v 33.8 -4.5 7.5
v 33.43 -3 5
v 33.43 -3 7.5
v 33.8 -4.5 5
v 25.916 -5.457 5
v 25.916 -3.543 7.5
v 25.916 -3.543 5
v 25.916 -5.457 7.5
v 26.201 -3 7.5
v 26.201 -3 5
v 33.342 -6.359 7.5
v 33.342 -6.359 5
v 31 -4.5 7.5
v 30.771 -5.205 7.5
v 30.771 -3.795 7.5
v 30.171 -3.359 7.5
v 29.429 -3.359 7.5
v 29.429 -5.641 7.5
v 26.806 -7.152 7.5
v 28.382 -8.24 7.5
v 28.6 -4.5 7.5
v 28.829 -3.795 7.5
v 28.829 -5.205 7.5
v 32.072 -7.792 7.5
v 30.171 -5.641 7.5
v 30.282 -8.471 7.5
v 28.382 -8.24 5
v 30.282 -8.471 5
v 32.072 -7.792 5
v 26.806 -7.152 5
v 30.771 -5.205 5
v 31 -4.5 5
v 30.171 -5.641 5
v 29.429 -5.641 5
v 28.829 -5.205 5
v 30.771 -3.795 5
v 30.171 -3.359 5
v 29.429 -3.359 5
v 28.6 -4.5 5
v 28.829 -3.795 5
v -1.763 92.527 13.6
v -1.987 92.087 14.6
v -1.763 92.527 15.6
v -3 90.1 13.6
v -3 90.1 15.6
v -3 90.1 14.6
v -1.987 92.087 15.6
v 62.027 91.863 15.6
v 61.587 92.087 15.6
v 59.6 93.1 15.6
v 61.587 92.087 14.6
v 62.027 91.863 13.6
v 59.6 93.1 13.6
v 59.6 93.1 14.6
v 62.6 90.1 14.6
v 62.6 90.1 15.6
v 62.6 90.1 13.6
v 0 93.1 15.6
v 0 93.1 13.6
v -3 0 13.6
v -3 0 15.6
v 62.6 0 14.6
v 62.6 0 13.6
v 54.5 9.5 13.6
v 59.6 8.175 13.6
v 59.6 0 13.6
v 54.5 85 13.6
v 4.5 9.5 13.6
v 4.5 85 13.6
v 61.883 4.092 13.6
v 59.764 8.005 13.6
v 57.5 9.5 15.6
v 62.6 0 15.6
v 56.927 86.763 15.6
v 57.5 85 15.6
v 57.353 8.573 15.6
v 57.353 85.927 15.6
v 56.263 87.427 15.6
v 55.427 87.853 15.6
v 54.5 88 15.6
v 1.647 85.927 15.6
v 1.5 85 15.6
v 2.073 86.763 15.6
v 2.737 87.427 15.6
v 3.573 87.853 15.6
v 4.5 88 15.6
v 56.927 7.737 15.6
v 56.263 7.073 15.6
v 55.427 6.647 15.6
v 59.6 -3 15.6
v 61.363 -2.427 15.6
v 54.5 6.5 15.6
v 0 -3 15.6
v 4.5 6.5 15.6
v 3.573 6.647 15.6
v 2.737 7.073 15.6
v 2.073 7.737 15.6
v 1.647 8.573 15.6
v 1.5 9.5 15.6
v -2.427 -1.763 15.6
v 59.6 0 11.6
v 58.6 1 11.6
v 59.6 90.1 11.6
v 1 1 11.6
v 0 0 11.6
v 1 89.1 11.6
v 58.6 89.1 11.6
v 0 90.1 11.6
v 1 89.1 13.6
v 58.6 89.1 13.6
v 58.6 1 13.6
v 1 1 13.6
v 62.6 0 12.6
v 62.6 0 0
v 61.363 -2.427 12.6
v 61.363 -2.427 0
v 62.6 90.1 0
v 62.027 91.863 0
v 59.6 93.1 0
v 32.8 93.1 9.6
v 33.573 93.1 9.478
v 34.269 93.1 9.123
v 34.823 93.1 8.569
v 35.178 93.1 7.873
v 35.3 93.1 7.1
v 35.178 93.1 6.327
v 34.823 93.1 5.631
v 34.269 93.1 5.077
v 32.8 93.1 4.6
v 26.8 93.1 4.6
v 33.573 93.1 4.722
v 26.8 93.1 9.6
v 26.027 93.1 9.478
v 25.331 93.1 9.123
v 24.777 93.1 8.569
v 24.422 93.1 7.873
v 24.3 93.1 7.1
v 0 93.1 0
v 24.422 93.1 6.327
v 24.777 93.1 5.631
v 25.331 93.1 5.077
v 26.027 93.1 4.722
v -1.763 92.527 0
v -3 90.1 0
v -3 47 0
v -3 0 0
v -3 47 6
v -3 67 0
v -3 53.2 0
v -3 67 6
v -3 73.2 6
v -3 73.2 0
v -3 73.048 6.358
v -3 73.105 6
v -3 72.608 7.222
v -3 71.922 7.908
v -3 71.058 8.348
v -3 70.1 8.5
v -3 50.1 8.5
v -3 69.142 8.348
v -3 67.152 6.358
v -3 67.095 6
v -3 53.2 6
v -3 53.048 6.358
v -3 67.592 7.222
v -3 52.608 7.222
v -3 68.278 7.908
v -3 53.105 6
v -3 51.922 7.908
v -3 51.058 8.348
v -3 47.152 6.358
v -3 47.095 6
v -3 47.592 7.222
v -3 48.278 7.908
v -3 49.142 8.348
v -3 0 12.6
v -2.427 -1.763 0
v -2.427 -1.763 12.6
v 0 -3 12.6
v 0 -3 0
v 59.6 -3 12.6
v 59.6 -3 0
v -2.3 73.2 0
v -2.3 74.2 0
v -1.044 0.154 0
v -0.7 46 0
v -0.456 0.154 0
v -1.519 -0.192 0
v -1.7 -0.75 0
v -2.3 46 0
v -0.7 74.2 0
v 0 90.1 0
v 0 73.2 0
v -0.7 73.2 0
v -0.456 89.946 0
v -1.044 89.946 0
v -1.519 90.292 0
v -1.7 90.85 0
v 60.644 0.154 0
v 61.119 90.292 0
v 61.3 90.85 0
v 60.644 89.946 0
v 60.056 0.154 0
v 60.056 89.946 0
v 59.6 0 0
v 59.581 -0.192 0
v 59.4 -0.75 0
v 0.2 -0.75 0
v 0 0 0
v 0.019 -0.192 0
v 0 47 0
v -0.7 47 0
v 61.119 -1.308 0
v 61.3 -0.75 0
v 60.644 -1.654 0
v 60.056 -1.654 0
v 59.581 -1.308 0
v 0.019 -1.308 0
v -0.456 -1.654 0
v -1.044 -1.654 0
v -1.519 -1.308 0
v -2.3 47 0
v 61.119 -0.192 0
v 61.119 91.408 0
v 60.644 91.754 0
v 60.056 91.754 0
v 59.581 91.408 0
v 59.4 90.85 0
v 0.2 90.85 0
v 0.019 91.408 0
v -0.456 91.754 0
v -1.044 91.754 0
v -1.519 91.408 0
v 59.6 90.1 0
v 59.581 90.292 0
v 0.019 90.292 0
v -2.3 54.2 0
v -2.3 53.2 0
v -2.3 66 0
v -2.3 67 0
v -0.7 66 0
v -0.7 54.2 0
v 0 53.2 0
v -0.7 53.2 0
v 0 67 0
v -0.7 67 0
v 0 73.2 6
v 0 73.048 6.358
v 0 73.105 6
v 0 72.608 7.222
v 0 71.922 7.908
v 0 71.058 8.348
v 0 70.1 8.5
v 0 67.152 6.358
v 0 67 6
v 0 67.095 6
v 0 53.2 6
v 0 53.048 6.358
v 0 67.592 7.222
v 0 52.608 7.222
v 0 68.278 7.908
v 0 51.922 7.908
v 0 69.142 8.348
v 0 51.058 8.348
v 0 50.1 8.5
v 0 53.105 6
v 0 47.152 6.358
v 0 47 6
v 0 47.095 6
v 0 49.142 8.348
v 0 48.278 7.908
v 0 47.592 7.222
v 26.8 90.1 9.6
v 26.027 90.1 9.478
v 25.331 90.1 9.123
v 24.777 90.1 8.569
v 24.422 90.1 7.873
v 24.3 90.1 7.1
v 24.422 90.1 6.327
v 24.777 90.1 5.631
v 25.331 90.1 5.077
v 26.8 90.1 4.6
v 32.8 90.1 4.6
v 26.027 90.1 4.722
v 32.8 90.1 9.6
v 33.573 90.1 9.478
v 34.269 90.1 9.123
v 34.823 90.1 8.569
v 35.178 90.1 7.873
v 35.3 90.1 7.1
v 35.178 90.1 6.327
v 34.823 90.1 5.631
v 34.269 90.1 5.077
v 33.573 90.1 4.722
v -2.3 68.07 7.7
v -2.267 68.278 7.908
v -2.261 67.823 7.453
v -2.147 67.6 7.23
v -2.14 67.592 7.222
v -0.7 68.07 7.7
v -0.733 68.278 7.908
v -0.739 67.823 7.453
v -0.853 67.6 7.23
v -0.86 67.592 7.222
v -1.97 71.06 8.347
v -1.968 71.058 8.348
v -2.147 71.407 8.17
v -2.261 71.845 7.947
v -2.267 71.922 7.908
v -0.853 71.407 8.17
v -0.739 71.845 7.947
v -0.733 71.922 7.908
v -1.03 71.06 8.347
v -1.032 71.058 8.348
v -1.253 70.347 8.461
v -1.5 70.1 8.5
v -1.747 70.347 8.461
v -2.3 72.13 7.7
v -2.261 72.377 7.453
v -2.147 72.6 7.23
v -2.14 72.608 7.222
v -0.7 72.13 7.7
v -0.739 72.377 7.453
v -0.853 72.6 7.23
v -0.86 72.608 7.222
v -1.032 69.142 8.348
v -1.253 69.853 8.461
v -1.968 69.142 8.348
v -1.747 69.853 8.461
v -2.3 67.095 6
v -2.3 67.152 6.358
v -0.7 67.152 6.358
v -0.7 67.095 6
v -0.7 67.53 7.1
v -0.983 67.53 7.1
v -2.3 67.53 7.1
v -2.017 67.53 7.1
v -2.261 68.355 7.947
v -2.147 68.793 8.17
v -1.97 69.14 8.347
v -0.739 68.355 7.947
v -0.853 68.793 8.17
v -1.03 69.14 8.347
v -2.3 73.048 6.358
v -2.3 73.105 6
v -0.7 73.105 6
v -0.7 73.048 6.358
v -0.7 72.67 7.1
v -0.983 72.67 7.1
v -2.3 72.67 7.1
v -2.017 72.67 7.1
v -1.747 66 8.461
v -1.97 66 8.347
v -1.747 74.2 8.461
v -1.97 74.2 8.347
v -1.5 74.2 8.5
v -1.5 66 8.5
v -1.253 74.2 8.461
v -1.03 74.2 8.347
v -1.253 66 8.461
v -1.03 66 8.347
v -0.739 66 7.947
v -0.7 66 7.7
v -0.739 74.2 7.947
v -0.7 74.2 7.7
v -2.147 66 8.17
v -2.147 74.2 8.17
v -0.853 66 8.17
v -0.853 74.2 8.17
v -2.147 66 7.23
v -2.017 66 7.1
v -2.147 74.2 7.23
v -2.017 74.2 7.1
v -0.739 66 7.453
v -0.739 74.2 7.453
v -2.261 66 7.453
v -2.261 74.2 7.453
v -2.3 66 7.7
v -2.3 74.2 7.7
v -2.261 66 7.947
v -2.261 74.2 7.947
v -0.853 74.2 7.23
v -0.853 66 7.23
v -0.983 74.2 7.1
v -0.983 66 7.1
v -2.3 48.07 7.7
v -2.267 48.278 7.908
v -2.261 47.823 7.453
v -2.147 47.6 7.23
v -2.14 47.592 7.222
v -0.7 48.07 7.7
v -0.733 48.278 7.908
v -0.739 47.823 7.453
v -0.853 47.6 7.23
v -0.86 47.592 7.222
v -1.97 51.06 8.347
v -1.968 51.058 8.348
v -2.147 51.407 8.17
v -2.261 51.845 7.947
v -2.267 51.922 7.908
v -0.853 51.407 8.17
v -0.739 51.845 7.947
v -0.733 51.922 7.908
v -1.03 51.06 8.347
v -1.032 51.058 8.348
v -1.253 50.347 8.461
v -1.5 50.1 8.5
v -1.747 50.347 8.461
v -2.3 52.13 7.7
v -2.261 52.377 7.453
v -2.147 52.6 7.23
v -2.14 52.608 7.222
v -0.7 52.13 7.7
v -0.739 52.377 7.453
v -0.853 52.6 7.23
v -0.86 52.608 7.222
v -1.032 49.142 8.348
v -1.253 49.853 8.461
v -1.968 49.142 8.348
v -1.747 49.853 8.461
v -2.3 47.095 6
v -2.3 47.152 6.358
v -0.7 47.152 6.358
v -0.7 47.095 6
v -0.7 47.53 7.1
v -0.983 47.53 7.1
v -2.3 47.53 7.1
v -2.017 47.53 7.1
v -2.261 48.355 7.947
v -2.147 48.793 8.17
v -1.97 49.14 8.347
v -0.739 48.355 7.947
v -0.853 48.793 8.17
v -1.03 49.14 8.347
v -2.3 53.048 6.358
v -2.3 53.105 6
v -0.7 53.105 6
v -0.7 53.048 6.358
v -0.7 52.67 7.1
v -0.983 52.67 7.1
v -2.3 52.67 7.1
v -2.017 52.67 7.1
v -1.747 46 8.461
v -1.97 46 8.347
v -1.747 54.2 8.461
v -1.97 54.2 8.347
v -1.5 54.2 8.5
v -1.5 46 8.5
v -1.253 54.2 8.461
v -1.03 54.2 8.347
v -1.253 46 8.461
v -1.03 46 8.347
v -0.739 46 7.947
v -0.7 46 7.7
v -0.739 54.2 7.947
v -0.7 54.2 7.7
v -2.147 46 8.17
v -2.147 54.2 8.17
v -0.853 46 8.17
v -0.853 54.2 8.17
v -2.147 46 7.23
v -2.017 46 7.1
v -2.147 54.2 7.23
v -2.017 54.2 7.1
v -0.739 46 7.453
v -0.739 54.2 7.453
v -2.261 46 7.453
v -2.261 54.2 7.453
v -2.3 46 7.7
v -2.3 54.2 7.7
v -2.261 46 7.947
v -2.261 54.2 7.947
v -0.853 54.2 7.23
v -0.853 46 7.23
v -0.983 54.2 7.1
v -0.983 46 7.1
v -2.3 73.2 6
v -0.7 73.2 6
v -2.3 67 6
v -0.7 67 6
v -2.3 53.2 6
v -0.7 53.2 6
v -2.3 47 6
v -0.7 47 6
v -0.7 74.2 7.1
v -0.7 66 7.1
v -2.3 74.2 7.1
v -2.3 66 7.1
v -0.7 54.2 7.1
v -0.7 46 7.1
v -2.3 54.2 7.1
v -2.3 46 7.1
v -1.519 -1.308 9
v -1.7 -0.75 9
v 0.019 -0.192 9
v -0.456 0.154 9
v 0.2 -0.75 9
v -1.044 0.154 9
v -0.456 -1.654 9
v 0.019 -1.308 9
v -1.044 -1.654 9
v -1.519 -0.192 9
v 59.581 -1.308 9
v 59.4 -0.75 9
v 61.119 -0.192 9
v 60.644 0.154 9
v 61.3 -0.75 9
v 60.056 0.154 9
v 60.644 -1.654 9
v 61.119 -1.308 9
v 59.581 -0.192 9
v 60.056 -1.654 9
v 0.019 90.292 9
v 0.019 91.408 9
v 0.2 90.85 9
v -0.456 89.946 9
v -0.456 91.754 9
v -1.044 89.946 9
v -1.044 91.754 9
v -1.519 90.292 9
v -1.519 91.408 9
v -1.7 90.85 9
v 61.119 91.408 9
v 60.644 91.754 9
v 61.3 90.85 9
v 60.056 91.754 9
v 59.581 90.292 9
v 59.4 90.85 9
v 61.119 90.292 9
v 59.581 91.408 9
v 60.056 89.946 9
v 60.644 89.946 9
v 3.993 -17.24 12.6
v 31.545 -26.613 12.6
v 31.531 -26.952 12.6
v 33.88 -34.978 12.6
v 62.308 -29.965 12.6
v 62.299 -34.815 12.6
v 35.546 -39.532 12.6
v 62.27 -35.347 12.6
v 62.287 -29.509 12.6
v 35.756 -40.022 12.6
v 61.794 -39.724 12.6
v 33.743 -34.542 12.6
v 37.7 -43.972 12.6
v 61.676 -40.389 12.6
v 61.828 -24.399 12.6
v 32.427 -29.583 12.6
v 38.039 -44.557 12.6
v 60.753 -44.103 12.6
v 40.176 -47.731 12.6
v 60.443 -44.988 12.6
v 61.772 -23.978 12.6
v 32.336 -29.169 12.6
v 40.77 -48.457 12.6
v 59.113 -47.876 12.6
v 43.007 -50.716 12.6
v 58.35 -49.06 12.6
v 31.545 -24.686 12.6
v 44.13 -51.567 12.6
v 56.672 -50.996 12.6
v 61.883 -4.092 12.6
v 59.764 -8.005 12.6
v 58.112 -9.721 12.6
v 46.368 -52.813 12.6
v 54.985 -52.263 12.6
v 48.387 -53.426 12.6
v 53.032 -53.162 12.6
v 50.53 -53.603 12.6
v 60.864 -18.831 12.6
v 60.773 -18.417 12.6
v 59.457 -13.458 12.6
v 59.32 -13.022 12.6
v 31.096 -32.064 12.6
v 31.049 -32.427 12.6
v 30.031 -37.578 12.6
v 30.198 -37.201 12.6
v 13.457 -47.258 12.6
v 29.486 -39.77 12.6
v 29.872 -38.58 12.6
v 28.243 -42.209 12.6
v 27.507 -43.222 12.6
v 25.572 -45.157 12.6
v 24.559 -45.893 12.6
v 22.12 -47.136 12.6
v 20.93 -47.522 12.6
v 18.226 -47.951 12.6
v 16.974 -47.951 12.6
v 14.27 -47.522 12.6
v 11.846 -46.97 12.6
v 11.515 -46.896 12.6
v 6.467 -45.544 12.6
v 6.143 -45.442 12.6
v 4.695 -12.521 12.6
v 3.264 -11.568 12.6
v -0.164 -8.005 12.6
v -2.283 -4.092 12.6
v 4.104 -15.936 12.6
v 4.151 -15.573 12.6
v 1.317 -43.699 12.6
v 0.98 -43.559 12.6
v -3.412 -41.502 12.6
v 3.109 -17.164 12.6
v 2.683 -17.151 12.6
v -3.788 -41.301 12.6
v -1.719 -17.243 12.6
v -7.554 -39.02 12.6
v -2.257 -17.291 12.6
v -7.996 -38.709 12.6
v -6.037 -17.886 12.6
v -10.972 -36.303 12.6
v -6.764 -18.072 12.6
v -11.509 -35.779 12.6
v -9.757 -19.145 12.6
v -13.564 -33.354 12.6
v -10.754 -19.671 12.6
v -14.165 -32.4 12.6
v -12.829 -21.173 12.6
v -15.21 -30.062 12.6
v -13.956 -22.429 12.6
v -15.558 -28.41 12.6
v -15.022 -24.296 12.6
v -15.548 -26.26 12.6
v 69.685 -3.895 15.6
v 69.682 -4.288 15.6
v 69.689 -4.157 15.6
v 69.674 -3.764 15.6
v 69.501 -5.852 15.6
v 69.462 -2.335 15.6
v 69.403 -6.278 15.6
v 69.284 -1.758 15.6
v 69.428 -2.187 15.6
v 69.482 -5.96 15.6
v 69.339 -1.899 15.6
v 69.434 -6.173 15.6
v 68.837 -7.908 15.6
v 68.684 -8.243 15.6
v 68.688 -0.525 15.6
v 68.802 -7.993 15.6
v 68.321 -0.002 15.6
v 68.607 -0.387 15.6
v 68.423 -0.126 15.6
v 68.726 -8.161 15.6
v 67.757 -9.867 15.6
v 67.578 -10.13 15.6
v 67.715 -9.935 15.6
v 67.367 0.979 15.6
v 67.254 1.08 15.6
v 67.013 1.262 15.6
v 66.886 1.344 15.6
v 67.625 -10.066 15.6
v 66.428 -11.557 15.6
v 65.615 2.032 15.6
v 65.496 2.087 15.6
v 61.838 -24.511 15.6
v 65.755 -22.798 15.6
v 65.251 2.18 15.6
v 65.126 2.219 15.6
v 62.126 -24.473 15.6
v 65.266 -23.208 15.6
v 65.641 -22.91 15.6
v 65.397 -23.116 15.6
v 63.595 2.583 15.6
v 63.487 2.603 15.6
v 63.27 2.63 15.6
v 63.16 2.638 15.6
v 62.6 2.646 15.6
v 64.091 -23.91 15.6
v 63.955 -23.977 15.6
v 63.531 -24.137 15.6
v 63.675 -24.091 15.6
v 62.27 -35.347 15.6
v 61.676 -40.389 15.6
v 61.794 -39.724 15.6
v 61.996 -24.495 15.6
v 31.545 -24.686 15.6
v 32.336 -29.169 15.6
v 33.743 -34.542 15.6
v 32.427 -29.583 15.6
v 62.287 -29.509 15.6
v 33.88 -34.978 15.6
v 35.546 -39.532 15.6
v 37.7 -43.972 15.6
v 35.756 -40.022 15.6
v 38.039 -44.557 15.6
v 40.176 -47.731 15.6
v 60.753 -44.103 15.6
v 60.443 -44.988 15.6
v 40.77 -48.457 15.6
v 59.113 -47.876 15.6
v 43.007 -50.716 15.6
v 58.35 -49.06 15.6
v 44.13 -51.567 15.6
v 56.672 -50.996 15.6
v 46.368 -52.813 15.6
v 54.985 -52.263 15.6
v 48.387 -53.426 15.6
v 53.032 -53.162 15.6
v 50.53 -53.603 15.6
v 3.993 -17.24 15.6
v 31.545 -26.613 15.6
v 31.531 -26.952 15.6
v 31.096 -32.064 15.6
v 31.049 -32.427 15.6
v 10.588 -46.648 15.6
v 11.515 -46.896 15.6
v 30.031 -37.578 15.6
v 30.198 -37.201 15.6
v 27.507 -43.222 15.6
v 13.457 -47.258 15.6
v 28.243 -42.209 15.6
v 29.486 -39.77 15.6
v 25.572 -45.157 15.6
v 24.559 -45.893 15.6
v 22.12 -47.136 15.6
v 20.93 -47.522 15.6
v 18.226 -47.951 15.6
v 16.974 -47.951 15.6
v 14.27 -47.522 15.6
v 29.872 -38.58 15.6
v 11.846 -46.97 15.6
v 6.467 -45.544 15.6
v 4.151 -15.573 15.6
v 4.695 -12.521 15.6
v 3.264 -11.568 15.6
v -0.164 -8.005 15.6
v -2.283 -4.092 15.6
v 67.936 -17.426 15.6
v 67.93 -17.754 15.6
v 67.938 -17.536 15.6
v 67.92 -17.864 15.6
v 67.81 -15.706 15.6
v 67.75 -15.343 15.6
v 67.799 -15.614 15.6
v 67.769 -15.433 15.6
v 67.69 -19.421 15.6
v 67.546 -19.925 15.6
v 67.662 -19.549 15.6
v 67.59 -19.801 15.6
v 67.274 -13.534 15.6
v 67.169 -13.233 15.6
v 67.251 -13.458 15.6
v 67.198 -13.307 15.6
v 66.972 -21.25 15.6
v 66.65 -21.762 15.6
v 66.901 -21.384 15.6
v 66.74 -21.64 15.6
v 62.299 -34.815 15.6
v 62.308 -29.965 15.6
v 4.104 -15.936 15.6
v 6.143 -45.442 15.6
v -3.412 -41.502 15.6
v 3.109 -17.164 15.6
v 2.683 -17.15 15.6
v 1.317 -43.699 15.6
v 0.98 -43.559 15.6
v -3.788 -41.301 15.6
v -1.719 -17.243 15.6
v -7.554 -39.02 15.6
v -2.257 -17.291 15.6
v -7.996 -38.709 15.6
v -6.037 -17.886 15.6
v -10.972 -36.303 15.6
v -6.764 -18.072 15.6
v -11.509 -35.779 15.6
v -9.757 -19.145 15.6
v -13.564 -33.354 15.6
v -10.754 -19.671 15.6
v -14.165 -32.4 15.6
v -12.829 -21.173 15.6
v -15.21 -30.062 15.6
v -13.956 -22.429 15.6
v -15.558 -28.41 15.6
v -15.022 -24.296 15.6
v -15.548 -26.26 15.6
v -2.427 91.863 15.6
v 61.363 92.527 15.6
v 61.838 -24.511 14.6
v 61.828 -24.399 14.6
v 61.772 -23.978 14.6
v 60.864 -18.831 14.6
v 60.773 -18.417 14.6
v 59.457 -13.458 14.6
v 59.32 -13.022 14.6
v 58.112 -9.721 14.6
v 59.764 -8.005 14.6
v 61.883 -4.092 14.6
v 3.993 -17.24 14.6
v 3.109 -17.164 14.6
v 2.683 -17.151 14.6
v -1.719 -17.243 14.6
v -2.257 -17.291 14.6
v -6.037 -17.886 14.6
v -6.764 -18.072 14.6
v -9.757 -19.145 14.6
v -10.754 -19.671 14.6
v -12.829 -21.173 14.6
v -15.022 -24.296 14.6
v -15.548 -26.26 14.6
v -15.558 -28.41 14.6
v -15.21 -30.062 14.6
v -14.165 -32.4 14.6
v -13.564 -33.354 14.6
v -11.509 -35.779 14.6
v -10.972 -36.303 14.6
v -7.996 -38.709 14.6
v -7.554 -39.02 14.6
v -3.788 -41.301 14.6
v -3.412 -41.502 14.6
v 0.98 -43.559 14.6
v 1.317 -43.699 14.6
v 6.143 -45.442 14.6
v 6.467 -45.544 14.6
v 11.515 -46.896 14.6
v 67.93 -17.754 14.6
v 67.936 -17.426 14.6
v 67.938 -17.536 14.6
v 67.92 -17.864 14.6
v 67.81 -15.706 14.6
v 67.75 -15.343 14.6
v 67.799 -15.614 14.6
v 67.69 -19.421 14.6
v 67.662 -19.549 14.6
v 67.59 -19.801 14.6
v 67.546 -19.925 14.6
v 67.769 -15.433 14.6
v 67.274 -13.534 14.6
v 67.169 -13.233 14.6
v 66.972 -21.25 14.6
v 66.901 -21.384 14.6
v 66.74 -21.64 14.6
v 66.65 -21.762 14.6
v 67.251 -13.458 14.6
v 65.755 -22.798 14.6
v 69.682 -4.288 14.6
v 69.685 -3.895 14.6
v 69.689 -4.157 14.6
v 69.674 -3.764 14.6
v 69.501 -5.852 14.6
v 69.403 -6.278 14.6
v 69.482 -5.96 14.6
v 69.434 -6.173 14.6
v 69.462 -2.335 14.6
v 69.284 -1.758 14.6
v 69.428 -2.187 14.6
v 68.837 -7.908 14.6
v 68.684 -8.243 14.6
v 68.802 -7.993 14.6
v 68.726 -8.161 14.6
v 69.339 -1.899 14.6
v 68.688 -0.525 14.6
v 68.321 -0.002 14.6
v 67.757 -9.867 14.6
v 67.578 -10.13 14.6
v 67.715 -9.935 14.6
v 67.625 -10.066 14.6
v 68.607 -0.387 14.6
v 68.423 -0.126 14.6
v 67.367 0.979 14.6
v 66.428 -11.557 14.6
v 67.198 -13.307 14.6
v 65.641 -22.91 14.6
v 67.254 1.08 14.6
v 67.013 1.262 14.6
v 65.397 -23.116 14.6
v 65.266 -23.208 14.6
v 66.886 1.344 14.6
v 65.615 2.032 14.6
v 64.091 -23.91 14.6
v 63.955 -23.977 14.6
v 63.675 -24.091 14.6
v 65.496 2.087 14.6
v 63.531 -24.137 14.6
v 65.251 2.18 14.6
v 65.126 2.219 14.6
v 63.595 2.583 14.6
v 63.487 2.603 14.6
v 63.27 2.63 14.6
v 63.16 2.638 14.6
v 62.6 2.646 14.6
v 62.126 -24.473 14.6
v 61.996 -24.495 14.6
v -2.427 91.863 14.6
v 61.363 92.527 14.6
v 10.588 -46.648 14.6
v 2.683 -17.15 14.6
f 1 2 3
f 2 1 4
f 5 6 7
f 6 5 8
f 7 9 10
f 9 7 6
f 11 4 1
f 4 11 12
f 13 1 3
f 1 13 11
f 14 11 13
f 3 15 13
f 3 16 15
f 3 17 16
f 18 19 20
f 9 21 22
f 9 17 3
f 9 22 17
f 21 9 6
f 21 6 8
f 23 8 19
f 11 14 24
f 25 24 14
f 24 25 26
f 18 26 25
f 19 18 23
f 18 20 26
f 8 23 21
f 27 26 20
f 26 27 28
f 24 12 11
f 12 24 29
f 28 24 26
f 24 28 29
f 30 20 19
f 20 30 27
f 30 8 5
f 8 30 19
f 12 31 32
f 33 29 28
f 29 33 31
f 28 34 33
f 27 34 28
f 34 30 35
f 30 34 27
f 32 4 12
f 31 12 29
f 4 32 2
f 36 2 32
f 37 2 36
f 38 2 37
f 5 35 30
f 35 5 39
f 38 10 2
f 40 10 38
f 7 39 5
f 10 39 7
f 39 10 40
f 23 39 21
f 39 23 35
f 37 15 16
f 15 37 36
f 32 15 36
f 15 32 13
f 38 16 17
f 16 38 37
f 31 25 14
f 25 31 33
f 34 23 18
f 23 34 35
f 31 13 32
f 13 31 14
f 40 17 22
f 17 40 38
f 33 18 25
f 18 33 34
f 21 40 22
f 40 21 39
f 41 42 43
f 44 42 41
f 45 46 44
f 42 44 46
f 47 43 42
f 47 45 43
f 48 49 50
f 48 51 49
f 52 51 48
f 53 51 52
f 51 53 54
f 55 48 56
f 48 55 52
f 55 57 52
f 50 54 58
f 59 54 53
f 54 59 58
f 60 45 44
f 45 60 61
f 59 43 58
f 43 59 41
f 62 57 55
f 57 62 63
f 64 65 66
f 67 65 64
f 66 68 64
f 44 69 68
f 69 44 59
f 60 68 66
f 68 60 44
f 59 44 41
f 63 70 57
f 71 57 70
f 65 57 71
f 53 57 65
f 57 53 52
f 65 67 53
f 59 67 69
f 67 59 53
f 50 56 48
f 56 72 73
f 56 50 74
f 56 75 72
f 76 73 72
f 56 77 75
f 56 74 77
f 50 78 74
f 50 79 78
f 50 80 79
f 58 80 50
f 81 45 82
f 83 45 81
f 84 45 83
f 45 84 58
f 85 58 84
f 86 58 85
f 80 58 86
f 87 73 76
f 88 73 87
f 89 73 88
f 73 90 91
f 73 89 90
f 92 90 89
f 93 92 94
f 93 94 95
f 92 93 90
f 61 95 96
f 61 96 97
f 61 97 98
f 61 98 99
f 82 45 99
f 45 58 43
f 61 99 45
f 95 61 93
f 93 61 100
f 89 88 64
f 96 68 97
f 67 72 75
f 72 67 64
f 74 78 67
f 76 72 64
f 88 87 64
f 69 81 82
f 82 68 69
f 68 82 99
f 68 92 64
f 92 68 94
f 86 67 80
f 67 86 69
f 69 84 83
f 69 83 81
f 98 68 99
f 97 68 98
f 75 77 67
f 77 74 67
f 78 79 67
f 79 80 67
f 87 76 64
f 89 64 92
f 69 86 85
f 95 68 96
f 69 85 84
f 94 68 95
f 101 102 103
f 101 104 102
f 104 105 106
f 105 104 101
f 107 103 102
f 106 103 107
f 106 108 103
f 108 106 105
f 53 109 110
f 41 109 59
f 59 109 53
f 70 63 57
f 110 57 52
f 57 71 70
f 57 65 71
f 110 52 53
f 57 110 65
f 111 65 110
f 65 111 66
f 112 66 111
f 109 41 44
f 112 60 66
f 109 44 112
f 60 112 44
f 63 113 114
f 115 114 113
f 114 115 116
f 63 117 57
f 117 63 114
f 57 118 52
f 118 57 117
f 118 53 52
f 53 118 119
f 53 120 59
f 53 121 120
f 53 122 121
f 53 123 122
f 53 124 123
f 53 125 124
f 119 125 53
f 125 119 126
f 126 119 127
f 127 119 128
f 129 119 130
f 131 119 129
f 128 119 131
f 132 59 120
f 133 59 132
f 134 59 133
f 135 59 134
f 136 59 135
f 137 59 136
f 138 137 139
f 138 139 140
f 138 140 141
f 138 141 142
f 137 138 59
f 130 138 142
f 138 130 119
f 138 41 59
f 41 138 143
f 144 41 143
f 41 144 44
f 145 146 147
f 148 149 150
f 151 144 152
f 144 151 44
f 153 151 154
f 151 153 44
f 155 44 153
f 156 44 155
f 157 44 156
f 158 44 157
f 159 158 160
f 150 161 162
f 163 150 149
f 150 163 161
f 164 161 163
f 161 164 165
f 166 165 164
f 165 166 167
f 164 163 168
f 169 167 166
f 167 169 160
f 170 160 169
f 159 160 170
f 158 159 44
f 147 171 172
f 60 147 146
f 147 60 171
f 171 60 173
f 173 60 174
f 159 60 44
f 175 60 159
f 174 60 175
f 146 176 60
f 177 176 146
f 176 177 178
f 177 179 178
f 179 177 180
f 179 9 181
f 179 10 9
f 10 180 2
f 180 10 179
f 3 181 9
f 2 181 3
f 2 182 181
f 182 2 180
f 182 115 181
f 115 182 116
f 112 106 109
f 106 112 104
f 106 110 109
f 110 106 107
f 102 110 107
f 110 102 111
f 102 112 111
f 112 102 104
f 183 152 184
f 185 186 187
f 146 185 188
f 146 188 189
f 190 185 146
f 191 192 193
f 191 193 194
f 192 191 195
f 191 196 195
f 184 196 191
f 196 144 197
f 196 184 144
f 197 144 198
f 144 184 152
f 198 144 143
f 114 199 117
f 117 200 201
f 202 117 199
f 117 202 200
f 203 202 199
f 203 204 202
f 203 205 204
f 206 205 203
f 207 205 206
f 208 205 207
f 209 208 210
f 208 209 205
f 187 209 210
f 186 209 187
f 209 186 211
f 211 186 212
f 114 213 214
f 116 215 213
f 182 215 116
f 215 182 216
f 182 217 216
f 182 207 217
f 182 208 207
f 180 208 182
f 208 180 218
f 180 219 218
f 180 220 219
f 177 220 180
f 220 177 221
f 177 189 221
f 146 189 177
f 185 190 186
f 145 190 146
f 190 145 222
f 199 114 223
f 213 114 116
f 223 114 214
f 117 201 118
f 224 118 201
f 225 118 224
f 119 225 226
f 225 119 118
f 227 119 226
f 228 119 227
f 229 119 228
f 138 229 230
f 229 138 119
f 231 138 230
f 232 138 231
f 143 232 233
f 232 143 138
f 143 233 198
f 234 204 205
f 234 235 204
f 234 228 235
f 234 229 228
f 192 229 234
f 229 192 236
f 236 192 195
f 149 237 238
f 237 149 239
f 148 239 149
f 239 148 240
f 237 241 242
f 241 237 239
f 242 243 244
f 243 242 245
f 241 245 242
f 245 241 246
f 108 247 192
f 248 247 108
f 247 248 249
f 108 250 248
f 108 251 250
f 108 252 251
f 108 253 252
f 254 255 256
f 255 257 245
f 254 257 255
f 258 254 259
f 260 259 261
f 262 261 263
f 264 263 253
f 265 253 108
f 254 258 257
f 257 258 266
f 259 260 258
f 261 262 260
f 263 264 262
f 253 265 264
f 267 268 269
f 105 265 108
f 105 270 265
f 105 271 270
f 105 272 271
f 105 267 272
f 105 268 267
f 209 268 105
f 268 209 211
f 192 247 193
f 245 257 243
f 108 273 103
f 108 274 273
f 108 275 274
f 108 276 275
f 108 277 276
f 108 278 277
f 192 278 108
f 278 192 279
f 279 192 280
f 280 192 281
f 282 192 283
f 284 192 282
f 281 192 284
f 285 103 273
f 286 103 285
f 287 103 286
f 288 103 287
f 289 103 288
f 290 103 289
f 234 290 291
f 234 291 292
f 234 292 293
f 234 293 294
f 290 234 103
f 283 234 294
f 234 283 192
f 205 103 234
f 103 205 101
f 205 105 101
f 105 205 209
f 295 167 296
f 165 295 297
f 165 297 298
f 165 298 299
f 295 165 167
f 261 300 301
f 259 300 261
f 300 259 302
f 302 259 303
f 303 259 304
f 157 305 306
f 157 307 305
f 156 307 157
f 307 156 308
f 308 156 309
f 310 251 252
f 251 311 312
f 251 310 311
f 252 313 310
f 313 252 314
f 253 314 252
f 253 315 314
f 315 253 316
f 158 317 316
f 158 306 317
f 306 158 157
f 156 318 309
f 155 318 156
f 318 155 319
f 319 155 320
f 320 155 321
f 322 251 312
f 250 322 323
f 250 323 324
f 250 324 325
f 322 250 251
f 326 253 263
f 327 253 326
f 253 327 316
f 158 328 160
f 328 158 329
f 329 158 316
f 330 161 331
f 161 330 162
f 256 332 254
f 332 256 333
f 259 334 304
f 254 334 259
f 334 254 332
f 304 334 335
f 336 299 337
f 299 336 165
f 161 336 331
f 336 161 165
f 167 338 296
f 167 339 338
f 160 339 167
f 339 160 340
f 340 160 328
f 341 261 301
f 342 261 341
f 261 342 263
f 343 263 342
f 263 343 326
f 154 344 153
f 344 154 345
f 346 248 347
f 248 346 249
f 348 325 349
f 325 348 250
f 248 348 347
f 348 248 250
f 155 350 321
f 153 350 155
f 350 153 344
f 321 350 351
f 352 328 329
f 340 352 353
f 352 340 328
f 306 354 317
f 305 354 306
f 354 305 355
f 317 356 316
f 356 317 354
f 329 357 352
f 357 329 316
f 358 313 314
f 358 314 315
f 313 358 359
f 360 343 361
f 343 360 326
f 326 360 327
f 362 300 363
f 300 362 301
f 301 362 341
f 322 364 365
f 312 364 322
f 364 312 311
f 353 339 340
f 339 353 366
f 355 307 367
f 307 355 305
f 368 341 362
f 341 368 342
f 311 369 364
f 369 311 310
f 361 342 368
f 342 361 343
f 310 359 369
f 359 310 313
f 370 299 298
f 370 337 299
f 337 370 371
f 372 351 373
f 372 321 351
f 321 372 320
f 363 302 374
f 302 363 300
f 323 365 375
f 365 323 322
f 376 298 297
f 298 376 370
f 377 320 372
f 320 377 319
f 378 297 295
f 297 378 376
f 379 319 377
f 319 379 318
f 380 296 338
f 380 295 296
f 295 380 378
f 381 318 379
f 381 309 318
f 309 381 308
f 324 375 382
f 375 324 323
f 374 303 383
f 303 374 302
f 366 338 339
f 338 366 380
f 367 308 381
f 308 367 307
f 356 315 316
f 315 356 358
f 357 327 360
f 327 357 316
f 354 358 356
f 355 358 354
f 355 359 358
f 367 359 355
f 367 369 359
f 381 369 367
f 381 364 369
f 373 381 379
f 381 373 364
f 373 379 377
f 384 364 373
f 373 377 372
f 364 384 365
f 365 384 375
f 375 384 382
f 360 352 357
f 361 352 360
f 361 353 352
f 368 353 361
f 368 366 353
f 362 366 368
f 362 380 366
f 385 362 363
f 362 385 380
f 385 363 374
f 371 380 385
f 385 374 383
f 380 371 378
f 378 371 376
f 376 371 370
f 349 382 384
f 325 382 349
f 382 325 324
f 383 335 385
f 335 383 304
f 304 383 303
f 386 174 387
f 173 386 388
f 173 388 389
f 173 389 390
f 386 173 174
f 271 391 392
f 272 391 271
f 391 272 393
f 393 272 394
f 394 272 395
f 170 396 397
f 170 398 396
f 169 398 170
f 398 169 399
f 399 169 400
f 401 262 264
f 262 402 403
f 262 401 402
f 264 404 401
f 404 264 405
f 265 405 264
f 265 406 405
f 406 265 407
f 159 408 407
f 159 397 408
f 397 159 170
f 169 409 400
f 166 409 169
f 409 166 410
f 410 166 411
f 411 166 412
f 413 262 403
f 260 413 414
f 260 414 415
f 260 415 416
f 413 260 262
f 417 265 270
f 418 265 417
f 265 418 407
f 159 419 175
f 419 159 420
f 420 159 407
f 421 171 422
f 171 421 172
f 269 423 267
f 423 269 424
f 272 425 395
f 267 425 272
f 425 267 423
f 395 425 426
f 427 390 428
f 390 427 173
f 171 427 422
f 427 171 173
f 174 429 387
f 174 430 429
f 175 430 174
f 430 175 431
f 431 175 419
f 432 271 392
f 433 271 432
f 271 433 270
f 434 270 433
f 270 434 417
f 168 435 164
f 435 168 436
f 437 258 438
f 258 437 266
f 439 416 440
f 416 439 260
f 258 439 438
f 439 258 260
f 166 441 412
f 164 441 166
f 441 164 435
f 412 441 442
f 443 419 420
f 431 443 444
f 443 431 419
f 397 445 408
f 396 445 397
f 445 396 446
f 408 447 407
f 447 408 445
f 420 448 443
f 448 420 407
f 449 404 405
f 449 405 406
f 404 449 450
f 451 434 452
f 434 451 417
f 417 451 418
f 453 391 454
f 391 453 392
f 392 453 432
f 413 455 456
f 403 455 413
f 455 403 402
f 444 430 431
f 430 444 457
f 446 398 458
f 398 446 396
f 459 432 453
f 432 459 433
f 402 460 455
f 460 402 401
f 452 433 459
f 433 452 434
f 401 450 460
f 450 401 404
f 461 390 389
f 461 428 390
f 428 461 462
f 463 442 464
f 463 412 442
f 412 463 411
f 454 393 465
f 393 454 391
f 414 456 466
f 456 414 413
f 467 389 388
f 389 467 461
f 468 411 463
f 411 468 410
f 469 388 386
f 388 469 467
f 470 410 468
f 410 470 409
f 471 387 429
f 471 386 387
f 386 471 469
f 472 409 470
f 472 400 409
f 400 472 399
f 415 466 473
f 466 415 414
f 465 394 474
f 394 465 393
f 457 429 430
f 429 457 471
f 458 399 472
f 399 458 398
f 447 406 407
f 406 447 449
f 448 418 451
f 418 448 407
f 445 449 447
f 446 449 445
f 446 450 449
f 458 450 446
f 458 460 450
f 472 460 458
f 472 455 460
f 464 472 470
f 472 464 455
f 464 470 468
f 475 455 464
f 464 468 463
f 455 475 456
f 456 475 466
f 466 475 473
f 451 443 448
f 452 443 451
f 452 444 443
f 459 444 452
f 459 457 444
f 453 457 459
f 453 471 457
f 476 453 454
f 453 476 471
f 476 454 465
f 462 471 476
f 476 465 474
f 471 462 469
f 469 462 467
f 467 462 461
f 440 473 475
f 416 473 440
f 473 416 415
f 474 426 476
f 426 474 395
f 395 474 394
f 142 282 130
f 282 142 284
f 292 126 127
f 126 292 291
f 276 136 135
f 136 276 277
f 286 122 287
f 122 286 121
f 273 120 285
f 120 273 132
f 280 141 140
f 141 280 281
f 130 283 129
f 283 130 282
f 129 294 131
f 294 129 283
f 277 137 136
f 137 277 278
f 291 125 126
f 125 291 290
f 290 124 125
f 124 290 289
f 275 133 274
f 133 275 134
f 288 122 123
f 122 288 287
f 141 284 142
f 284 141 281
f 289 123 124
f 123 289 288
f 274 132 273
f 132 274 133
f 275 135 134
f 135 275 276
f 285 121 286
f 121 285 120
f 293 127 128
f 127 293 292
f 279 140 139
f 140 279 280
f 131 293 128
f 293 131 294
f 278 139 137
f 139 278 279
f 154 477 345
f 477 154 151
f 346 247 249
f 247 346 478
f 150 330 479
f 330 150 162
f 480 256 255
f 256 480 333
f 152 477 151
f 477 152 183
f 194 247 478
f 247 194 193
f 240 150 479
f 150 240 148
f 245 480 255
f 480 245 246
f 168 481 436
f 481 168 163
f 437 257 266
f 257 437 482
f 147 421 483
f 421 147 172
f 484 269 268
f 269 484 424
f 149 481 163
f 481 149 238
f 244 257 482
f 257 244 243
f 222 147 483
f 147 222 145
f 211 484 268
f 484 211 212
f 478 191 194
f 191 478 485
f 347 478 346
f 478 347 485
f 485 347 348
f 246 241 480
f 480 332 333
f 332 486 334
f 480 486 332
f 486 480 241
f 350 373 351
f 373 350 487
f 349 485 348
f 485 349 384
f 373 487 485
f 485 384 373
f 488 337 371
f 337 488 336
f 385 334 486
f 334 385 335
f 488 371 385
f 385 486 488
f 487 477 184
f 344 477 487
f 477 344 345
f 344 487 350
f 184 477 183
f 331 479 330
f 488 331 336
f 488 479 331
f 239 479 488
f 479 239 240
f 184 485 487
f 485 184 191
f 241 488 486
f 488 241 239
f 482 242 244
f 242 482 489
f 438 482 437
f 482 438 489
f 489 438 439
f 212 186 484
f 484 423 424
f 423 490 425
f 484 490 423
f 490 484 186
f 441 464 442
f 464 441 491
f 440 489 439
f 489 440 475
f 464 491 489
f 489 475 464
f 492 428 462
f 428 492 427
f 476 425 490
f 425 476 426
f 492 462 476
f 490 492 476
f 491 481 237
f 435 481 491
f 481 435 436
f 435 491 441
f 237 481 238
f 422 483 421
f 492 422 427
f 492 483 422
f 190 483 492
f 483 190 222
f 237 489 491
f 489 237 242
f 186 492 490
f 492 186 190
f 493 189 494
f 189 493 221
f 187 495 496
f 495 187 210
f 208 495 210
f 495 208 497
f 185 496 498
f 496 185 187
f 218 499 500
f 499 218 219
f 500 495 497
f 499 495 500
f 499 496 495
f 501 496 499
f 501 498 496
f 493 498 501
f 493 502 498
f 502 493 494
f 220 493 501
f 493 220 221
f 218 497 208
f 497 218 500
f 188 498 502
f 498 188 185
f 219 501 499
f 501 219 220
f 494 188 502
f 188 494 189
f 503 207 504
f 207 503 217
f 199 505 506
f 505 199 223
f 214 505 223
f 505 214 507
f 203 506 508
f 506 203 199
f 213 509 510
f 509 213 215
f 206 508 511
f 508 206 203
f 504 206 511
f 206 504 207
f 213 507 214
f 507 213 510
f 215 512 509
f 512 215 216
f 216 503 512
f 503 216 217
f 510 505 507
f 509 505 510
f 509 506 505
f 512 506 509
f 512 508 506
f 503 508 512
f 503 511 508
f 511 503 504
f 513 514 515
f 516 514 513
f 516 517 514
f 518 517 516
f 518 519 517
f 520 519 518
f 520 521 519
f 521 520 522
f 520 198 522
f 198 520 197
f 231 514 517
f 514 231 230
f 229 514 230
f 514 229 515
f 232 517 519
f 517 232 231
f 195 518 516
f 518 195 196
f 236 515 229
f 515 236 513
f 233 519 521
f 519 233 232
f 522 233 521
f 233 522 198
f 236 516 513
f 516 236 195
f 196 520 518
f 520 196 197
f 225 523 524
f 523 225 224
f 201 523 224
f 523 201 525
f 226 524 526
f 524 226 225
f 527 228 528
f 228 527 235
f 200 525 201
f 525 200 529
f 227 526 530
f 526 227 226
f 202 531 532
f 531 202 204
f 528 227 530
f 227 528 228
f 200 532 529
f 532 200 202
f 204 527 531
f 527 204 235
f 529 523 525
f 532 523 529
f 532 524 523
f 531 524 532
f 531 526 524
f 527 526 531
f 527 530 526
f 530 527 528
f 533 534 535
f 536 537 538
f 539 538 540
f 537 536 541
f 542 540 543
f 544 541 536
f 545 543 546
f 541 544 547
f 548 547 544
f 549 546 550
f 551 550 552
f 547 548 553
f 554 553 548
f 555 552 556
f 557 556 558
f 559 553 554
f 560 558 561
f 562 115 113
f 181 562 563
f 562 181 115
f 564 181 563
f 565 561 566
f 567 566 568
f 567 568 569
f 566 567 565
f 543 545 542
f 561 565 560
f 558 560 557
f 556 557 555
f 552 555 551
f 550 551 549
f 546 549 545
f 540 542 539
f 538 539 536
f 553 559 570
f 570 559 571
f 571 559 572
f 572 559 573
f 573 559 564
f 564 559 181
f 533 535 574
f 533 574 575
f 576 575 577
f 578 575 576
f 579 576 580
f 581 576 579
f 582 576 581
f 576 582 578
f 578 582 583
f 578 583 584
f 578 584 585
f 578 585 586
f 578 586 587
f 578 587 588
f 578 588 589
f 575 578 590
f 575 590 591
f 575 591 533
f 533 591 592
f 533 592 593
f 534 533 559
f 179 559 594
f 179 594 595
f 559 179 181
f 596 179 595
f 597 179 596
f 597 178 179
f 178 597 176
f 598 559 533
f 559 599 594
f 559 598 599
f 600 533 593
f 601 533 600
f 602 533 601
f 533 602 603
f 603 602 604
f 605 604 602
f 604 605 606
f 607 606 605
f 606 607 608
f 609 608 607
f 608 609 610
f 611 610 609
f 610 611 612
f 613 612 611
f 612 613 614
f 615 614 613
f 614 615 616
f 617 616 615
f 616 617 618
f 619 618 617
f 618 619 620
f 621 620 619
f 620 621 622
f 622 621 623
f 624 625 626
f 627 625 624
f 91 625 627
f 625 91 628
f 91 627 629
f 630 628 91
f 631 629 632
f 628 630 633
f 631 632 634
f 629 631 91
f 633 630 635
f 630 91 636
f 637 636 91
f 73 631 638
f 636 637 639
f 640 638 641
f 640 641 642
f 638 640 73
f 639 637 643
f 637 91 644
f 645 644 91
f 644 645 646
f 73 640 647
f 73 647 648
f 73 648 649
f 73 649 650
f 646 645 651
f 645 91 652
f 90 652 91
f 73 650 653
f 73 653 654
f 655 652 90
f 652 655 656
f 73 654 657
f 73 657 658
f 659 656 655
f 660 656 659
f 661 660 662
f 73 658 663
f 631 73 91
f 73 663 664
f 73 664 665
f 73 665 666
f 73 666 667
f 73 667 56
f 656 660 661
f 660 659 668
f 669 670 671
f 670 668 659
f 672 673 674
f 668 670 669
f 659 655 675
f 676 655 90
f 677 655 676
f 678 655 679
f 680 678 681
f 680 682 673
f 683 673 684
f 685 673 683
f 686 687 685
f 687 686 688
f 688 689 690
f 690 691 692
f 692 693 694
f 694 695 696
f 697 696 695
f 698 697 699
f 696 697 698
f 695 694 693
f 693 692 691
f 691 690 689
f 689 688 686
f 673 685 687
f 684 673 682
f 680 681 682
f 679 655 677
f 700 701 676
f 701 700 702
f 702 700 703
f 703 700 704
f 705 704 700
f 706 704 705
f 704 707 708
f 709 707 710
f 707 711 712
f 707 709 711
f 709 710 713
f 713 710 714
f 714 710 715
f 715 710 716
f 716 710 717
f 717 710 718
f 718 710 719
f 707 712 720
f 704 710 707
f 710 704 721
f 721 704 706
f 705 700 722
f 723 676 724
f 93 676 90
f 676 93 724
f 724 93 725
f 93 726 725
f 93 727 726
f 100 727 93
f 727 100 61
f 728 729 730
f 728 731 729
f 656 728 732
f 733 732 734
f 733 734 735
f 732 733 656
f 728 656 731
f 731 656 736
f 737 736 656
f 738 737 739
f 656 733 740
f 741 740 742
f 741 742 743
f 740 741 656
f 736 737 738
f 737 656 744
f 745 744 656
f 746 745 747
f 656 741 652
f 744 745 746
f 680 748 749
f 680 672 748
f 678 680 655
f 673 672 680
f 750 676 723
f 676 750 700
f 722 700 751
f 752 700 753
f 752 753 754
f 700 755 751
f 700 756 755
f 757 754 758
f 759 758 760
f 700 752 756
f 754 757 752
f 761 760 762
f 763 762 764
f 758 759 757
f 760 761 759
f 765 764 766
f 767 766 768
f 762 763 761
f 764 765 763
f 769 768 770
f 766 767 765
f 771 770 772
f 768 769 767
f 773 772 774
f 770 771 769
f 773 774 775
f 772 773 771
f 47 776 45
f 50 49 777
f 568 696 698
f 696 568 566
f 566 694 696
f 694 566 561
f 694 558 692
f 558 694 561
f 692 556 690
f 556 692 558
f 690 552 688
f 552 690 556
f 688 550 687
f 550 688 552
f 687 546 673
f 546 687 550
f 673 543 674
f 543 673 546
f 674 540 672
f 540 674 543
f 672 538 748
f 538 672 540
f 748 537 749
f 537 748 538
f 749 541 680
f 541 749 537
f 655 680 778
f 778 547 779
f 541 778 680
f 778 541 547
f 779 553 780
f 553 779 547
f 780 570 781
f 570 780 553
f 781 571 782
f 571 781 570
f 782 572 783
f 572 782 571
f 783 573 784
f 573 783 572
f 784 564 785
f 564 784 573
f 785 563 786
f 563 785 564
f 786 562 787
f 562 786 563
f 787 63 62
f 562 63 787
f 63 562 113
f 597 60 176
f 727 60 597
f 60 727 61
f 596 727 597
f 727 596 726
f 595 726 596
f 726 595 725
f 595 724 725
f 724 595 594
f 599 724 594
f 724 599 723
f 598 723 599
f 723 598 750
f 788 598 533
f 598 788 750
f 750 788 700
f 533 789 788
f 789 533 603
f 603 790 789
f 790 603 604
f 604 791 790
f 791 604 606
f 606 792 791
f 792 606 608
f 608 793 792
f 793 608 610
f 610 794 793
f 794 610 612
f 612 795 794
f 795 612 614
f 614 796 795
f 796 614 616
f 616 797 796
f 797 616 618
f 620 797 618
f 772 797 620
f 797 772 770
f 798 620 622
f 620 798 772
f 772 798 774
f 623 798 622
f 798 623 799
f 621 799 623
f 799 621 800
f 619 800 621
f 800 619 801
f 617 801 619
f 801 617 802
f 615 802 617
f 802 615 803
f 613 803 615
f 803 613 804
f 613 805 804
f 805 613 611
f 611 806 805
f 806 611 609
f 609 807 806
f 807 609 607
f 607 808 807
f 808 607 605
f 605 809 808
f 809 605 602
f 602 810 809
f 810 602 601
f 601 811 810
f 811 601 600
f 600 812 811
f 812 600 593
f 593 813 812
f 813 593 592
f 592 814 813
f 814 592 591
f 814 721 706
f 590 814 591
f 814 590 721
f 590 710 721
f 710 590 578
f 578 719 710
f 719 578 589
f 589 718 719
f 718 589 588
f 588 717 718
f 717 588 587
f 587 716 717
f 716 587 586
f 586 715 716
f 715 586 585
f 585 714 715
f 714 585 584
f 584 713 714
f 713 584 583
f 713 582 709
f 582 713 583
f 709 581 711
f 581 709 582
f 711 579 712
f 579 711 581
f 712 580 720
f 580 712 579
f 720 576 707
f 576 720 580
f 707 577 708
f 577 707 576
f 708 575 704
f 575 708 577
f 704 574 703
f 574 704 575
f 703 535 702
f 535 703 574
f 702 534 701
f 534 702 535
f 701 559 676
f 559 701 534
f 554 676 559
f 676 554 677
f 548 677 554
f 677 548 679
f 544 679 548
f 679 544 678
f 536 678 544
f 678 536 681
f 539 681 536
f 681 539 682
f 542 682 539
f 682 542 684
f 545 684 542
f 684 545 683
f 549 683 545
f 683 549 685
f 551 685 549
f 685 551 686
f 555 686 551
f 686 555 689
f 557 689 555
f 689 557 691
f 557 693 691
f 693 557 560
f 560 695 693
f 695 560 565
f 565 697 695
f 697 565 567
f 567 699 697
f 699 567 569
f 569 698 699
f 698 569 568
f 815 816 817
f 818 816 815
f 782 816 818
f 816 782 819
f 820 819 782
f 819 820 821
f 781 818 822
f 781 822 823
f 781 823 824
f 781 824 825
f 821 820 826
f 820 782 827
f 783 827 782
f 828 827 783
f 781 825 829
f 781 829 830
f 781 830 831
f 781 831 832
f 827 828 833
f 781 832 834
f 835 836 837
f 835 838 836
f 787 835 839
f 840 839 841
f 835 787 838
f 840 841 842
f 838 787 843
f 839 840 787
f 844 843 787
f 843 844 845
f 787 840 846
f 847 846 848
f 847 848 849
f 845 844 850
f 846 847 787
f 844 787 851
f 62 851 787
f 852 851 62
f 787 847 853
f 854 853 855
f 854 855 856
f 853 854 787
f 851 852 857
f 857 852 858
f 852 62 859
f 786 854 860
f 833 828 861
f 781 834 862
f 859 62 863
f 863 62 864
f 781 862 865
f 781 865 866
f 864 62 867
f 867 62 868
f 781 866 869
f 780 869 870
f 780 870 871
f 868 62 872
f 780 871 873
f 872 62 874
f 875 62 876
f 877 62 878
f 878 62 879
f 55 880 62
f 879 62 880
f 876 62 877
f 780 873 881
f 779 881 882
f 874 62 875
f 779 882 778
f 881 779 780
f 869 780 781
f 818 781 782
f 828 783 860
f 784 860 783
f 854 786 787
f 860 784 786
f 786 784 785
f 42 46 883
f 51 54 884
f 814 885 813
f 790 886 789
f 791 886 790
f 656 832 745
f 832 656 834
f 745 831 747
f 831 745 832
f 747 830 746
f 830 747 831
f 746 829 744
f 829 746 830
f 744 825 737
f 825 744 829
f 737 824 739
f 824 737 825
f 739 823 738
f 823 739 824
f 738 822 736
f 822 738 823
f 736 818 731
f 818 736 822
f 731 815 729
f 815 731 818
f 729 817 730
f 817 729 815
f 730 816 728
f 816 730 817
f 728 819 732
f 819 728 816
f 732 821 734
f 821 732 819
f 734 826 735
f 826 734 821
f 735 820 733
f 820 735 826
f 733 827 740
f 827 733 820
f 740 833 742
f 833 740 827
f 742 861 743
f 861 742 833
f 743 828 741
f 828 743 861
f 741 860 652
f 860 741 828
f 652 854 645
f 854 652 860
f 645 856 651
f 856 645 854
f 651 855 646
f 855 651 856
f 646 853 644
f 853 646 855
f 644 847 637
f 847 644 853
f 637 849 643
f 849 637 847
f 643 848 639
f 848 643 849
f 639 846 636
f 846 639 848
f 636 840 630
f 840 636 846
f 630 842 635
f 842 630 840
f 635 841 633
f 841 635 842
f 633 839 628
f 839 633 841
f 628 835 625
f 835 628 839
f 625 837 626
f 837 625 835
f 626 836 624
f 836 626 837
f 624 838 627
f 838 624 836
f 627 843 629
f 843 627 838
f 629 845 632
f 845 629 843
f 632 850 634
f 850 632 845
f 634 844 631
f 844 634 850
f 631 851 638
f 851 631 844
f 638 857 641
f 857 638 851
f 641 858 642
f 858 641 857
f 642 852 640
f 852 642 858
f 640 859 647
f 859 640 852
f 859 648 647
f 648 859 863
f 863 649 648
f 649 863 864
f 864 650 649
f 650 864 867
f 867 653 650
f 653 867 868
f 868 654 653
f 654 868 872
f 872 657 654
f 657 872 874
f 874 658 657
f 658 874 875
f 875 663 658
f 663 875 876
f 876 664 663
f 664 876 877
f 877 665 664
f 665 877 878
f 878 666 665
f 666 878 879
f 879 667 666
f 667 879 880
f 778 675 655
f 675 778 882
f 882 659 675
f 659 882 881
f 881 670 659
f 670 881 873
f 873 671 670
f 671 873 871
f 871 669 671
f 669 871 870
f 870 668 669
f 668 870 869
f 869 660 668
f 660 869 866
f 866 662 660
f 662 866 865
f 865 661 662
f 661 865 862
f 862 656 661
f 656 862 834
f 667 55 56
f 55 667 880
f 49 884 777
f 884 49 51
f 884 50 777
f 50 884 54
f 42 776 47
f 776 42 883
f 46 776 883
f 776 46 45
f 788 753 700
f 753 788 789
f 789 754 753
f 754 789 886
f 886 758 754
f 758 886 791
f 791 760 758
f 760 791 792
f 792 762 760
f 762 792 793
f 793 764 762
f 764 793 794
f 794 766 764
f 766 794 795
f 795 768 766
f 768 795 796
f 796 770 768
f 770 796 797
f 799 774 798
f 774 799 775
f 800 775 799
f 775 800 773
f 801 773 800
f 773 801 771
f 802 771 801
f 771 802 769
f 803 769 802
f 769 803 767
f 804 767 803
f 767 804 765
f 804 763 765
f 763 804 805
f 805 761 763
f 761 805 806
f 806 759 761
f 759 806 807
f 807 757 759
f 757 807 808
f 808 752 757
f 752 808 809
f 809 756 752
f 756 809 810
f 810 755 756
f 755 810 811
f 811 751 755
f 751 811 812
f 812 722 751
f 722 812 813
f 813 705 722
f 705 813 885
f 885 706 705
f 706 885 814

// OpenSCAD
board_size = [59+0.6, 89.5+0.6];
display_size = [50, 75.5];
board_z = 1.6;

boarder = 3;

//flower();
//ear();

module boarder(){
    color("black")
    union(){
    difference(){
    face(0);
    face(-1);
    }

    difference(){

    translate([42,-24,0])
    rotate([0,0,90])
    offset(3+1)
    scale(2.5)
    upper_ear_fold();

    translate([42,-24,0])
    rotate([0,0,90])
    offset(3)
    scale(2.5)
    upper_ear_fold();


    translate([30,-54,0])
    rotate([0,0,10])
    square([20,40]);


    }
    }
}

flower_offset=[-5,0,5,0];


module face(offset=0, no_frame = false){
    if(!no_frame){
        offset(boarder+offset)
        square(board_size);
    }
    translate([13,-24,0])
    rotate([0,0,90-10])
    ear(offset);
    
    translate([42,-24,0])
    rotate([0,0,90])
    ear_fold(offset);
    
    translate([board_size[0]/2,0,0])
    difference(){
        offset(offset)
        scale([1,0.6,1])
        circle(board_size[0]/2+3);
        translate([-board_size[0]/2,0,0])
        square([board_size[0]+3,board_size[1]]);
    }

}

module flower(){
    offset(1)
    for(i=[0:3])
    rotate([0,0,90*i+flower_offset[i]])
    translate([5,0,0])
    scale([1,0.65,1])
    circle(10);
}

module forhead(offset=0){
    translate([board_size[0]/2,0,board_z+1+10])
    linear_extrude(3)
    difference(){
        offset(offset)
        scale([1,0.6,1])
        circle(board_size[0]/2+3);
        translate([-board_size[0]/2,0,0])
        square([board_size[0]+3,board_size[1]]);
    }
}

module ear(offset = 2){
    color("pink")
    offset(offset+5){
        scale(2.5)
        scale([1,0.4,1])
        difference(){
        circle(10);
        
        translate([5,-10,0])
        square([5,20]);
        }
    }
}

module upper_ear_fold(){
        translate([-3.5,-2,0])
        rotate([0,0,105])
        difference(){
        scale([1,0.4,1])
        circle(10);
        
        translate([2,-15,0])
        square([10,20]);
        }
}

module ear_fold(offset = 2){
    color("pink")
    
    offset(offset+4)
    scale(2.5){
        
        translate([-4.5,0,0])
        circle(3.5, $fn=20);
        
    
        scale([1,0.4,1])
        difference(){
        circle(10);
        
        translate([5,-10,0])
        square([6,20]);
        
        translate([-12,-10,0])
        square([7,20]);
        }
        
        
        
        upper_ear_fold();
    }
}

module mymelo_case_no_parts(){
    difference(){
        mymelo_case();
        3d_boarder();
        3d_flower();
        3d_flower_boarder();
        3d_flower_core();
        3d_flower_core_boarder();
    }
    
}

module 3d_boarder(){
    difference(){
    color("black")
    translate([board_size[0],0,board_z+3+10])
    linear_extrude(1)
    mirror([1,0,0])
    boarder();
    
    3d_flower();
    3d_flower_boarder();
    
    3d_flower_core();
    3d_flower_core_boarder();
}

}

module 3d_flower(offset = 0){
    difference(){
    color("white")
    translate([board_size[0]-5,-10,board_z+3+10])
    linear_extrude(1)
    rotate([0,0,40])
    offset(offset)
    flower();
    
    3d_flower_core();
    3d_flower_core_boarder();
    }

}

module 3d_flower_core(offset = 0){
    color("yellow")
    translate([board_size[0]-5,-10,board_z+3+10])
    linear_extrude(1)
    offset(offset)
    rotate([0,0,30])
    scale([1,0.9,1])
    circle(4.5, $fn=20);
}

module 3d_flower_core_boarder(offset = 0){
    color("black")
    difference(){
        3d_flower_core(1);
        3d_flower_core(0);
    }
}

module 3d_flower_boarder(){
    color("black")
    difference(){
        3d_flower(1);
        3d_flower(0);
    }
}

mymelo_case_no_parts();
3d_boarder();
3d_flower();
3d_flower_boarder();
3d_flower_core();
3d_flower_core_boarder();


module mymelo_case() {
    color("pink")
    union(){
    case_with_holes();
    
    translate([board_size[0],0,board_z+1+10])
    linear_extrude(3)
    mirror([1,0,0])
    face(0, no_frame=true);
    
    
    }
}


//translate([7,board_size[1]-20, 10-3-board_z])
//rotate([0,-90,0])
//button();
//
//translate([7,board_size[1]-40, 10-3-board_z])
//rotate([0,-90,0])
//button();

module button(r = 3, h=boarder+9, hinge_y = 2, hinge_r = 0.6){
    $fn=20;
    {
    cylinder(h, r, r);

    translate([r-hinge_r,0,h-2-boarder/2])
    rotate([90,0,0])
    cylinder(r*2+hinge_y, hinge_r, hinge_r, center=true);
    
    rotate([0,90,0])
    cylinder(r, r, r);
    }
}


module case_with_holes(){
difference(){
case(10);

#translate([7,board_size[1]-20, 10-3-board_z])
rotate([0,-90,0])
button(r=3.1, hinge_r=0.8);

translate([7,board_size[1]-40, 10-3-board_z]){
rotate([0,-90,0])
button(r=3.1, hinge_r=0.8);
}

// typec hole
#translate([board_size[0]/2,board_size[1]+boarder+1.5,10+board_z-4])
hull(){
$fn=20;
rotate([90,0,0]){
translate([-6/2,-0.5,0])
cylinder(20, 5/2, 5/2);

translate([6/2,-0.5,0])
cylinder(20, 5/2, 5/2);
}

}



// Button holes
translate([-boarder,board_size[1]-20-3.1, 0])
cube([boarder, 3.1*2, 6]);

translate([-boarder,board_size[1]-40-3.1, 0])
cube([boarder, 3.1*2, 6]);

#translate([-boarder/2-0.8,board_size[1]-20-3.1-1, 0])
cube([0.8*2, 3.1*2+2, 7.1]);

translate([-boarder/2-0.8,board_size[1]-40-3.1-1, 0])
cube([0.8*2, 3.1*2+2, 7.1]);



#
translate([-boarder/4,-boarder/4,-1])
cylinder(10, 1.9/2, 1.9/2, $fn=10);

#translate([boarder/4+board_size[0],-boarder/4,-1])
cylinder(10, 1.9/2, 1.9/2, $fn=10);

#
translate([-boarder/4,boarder/4+board_size[1],-1])
cylinder(10, 1.9/2, 1.9/2, $fn=10);

#translate([boarder/4+board_size[0],boarder/4+board_size[1],-1])
cylinder(10, 1.9/2, 1.9/2, $fn=10);
}
}

//case_with_holes();


translate([0,0,0])
difference(){
//back_cover();

//for(i=[0:2])
//for(j=[0:2])
//translate([13+i*2.4-j,29.5+j*2.2,-1])
//rotate([0,0,360/12])
//cylinder(10, 1, 1, $fn=6);
//
//// camera hole
//translate([board_size[0]/2,board_size[1],0])
//cube([13,13*2,50], true);


}

module back_cover(){


difference(){
    linear_extrude(1)
    offset(boarder)
    square(board_size);
    
    #
    translate([-boarder/4,-boarder/4,-1])
    cylinder(10, 2.2/2, 2.2/2, $fn=10);
    
    #translate([boarder/4+board_size[0],-boarder/4,-1])
    cylinder(10, 2.2/2, 2.2/2, $fn=10);
    
    #
    translate([-boarder/4,boarder/4+board_size[1],-1])
    cylinder(10, 2.2/2, 2.2/2, $fn=10);
    
    #translate([boarder/4+board_size[0],boarder/4+board_size[1],-1])
    cylinder(10, 2.2/2, 2.2/2, $fn=10);
    

    
}

linear_extrude(2)
offset(-0.2)
square(board_size);

difference(){
    translate([-boarder,board_size[1]-20-3.1+0.1, 0])
    cube([boarder, 3.1*2-0.2, 6]);

    #translate([7,board_size[1]-20, 10-3-board_z+1])
    rotate([0,-90,0])
    #button(r=3.1, hinge_r=0.8);
}

difference(){
    translate([-boarder,board_size[1]-40-3.1+0.1, 0])
    cube([boarder, 3.1*2-0.2, 6]);

    #translate([7,board_size[1]-40, 10-3-board_z+1])
    rotate([0,-90,0])
    button(r=3.1, hinge_r=0.8);
    
   }

}

module case(thickness = 15){
translate([board_size[0]/2,-boarder-1.5,thickness/2])
difference(){
cylinder(2.5, 4, 4);
cylinder(3,   1.2, 1.2, $fn = 10);

}
translate([0,0,board_z+2+thickness])
difference(){
    linear_extrude(2)
    offset(boarder)
    square(board_size);


    hull(){
        translate([0,0,2])
        linear_extrude(0.001)
        offset(3, $fn=20)
        translate([9/2,9/2+5,0])
        square(display_size);

        linear_extrude(0.001)
        translate([9/2,9/2+5,0])
        square(display_size);
    }

}


translate([0,0,board_z+thickness])
linear_extrude(2)
difference(){
offset(boarder)
square(board_size);

offset(-1)
square(board_size);
}


linear_extrude(board_z+thickness)
difference(){
offset(boarder)
square(board_size);

square(board_size);

}
}
